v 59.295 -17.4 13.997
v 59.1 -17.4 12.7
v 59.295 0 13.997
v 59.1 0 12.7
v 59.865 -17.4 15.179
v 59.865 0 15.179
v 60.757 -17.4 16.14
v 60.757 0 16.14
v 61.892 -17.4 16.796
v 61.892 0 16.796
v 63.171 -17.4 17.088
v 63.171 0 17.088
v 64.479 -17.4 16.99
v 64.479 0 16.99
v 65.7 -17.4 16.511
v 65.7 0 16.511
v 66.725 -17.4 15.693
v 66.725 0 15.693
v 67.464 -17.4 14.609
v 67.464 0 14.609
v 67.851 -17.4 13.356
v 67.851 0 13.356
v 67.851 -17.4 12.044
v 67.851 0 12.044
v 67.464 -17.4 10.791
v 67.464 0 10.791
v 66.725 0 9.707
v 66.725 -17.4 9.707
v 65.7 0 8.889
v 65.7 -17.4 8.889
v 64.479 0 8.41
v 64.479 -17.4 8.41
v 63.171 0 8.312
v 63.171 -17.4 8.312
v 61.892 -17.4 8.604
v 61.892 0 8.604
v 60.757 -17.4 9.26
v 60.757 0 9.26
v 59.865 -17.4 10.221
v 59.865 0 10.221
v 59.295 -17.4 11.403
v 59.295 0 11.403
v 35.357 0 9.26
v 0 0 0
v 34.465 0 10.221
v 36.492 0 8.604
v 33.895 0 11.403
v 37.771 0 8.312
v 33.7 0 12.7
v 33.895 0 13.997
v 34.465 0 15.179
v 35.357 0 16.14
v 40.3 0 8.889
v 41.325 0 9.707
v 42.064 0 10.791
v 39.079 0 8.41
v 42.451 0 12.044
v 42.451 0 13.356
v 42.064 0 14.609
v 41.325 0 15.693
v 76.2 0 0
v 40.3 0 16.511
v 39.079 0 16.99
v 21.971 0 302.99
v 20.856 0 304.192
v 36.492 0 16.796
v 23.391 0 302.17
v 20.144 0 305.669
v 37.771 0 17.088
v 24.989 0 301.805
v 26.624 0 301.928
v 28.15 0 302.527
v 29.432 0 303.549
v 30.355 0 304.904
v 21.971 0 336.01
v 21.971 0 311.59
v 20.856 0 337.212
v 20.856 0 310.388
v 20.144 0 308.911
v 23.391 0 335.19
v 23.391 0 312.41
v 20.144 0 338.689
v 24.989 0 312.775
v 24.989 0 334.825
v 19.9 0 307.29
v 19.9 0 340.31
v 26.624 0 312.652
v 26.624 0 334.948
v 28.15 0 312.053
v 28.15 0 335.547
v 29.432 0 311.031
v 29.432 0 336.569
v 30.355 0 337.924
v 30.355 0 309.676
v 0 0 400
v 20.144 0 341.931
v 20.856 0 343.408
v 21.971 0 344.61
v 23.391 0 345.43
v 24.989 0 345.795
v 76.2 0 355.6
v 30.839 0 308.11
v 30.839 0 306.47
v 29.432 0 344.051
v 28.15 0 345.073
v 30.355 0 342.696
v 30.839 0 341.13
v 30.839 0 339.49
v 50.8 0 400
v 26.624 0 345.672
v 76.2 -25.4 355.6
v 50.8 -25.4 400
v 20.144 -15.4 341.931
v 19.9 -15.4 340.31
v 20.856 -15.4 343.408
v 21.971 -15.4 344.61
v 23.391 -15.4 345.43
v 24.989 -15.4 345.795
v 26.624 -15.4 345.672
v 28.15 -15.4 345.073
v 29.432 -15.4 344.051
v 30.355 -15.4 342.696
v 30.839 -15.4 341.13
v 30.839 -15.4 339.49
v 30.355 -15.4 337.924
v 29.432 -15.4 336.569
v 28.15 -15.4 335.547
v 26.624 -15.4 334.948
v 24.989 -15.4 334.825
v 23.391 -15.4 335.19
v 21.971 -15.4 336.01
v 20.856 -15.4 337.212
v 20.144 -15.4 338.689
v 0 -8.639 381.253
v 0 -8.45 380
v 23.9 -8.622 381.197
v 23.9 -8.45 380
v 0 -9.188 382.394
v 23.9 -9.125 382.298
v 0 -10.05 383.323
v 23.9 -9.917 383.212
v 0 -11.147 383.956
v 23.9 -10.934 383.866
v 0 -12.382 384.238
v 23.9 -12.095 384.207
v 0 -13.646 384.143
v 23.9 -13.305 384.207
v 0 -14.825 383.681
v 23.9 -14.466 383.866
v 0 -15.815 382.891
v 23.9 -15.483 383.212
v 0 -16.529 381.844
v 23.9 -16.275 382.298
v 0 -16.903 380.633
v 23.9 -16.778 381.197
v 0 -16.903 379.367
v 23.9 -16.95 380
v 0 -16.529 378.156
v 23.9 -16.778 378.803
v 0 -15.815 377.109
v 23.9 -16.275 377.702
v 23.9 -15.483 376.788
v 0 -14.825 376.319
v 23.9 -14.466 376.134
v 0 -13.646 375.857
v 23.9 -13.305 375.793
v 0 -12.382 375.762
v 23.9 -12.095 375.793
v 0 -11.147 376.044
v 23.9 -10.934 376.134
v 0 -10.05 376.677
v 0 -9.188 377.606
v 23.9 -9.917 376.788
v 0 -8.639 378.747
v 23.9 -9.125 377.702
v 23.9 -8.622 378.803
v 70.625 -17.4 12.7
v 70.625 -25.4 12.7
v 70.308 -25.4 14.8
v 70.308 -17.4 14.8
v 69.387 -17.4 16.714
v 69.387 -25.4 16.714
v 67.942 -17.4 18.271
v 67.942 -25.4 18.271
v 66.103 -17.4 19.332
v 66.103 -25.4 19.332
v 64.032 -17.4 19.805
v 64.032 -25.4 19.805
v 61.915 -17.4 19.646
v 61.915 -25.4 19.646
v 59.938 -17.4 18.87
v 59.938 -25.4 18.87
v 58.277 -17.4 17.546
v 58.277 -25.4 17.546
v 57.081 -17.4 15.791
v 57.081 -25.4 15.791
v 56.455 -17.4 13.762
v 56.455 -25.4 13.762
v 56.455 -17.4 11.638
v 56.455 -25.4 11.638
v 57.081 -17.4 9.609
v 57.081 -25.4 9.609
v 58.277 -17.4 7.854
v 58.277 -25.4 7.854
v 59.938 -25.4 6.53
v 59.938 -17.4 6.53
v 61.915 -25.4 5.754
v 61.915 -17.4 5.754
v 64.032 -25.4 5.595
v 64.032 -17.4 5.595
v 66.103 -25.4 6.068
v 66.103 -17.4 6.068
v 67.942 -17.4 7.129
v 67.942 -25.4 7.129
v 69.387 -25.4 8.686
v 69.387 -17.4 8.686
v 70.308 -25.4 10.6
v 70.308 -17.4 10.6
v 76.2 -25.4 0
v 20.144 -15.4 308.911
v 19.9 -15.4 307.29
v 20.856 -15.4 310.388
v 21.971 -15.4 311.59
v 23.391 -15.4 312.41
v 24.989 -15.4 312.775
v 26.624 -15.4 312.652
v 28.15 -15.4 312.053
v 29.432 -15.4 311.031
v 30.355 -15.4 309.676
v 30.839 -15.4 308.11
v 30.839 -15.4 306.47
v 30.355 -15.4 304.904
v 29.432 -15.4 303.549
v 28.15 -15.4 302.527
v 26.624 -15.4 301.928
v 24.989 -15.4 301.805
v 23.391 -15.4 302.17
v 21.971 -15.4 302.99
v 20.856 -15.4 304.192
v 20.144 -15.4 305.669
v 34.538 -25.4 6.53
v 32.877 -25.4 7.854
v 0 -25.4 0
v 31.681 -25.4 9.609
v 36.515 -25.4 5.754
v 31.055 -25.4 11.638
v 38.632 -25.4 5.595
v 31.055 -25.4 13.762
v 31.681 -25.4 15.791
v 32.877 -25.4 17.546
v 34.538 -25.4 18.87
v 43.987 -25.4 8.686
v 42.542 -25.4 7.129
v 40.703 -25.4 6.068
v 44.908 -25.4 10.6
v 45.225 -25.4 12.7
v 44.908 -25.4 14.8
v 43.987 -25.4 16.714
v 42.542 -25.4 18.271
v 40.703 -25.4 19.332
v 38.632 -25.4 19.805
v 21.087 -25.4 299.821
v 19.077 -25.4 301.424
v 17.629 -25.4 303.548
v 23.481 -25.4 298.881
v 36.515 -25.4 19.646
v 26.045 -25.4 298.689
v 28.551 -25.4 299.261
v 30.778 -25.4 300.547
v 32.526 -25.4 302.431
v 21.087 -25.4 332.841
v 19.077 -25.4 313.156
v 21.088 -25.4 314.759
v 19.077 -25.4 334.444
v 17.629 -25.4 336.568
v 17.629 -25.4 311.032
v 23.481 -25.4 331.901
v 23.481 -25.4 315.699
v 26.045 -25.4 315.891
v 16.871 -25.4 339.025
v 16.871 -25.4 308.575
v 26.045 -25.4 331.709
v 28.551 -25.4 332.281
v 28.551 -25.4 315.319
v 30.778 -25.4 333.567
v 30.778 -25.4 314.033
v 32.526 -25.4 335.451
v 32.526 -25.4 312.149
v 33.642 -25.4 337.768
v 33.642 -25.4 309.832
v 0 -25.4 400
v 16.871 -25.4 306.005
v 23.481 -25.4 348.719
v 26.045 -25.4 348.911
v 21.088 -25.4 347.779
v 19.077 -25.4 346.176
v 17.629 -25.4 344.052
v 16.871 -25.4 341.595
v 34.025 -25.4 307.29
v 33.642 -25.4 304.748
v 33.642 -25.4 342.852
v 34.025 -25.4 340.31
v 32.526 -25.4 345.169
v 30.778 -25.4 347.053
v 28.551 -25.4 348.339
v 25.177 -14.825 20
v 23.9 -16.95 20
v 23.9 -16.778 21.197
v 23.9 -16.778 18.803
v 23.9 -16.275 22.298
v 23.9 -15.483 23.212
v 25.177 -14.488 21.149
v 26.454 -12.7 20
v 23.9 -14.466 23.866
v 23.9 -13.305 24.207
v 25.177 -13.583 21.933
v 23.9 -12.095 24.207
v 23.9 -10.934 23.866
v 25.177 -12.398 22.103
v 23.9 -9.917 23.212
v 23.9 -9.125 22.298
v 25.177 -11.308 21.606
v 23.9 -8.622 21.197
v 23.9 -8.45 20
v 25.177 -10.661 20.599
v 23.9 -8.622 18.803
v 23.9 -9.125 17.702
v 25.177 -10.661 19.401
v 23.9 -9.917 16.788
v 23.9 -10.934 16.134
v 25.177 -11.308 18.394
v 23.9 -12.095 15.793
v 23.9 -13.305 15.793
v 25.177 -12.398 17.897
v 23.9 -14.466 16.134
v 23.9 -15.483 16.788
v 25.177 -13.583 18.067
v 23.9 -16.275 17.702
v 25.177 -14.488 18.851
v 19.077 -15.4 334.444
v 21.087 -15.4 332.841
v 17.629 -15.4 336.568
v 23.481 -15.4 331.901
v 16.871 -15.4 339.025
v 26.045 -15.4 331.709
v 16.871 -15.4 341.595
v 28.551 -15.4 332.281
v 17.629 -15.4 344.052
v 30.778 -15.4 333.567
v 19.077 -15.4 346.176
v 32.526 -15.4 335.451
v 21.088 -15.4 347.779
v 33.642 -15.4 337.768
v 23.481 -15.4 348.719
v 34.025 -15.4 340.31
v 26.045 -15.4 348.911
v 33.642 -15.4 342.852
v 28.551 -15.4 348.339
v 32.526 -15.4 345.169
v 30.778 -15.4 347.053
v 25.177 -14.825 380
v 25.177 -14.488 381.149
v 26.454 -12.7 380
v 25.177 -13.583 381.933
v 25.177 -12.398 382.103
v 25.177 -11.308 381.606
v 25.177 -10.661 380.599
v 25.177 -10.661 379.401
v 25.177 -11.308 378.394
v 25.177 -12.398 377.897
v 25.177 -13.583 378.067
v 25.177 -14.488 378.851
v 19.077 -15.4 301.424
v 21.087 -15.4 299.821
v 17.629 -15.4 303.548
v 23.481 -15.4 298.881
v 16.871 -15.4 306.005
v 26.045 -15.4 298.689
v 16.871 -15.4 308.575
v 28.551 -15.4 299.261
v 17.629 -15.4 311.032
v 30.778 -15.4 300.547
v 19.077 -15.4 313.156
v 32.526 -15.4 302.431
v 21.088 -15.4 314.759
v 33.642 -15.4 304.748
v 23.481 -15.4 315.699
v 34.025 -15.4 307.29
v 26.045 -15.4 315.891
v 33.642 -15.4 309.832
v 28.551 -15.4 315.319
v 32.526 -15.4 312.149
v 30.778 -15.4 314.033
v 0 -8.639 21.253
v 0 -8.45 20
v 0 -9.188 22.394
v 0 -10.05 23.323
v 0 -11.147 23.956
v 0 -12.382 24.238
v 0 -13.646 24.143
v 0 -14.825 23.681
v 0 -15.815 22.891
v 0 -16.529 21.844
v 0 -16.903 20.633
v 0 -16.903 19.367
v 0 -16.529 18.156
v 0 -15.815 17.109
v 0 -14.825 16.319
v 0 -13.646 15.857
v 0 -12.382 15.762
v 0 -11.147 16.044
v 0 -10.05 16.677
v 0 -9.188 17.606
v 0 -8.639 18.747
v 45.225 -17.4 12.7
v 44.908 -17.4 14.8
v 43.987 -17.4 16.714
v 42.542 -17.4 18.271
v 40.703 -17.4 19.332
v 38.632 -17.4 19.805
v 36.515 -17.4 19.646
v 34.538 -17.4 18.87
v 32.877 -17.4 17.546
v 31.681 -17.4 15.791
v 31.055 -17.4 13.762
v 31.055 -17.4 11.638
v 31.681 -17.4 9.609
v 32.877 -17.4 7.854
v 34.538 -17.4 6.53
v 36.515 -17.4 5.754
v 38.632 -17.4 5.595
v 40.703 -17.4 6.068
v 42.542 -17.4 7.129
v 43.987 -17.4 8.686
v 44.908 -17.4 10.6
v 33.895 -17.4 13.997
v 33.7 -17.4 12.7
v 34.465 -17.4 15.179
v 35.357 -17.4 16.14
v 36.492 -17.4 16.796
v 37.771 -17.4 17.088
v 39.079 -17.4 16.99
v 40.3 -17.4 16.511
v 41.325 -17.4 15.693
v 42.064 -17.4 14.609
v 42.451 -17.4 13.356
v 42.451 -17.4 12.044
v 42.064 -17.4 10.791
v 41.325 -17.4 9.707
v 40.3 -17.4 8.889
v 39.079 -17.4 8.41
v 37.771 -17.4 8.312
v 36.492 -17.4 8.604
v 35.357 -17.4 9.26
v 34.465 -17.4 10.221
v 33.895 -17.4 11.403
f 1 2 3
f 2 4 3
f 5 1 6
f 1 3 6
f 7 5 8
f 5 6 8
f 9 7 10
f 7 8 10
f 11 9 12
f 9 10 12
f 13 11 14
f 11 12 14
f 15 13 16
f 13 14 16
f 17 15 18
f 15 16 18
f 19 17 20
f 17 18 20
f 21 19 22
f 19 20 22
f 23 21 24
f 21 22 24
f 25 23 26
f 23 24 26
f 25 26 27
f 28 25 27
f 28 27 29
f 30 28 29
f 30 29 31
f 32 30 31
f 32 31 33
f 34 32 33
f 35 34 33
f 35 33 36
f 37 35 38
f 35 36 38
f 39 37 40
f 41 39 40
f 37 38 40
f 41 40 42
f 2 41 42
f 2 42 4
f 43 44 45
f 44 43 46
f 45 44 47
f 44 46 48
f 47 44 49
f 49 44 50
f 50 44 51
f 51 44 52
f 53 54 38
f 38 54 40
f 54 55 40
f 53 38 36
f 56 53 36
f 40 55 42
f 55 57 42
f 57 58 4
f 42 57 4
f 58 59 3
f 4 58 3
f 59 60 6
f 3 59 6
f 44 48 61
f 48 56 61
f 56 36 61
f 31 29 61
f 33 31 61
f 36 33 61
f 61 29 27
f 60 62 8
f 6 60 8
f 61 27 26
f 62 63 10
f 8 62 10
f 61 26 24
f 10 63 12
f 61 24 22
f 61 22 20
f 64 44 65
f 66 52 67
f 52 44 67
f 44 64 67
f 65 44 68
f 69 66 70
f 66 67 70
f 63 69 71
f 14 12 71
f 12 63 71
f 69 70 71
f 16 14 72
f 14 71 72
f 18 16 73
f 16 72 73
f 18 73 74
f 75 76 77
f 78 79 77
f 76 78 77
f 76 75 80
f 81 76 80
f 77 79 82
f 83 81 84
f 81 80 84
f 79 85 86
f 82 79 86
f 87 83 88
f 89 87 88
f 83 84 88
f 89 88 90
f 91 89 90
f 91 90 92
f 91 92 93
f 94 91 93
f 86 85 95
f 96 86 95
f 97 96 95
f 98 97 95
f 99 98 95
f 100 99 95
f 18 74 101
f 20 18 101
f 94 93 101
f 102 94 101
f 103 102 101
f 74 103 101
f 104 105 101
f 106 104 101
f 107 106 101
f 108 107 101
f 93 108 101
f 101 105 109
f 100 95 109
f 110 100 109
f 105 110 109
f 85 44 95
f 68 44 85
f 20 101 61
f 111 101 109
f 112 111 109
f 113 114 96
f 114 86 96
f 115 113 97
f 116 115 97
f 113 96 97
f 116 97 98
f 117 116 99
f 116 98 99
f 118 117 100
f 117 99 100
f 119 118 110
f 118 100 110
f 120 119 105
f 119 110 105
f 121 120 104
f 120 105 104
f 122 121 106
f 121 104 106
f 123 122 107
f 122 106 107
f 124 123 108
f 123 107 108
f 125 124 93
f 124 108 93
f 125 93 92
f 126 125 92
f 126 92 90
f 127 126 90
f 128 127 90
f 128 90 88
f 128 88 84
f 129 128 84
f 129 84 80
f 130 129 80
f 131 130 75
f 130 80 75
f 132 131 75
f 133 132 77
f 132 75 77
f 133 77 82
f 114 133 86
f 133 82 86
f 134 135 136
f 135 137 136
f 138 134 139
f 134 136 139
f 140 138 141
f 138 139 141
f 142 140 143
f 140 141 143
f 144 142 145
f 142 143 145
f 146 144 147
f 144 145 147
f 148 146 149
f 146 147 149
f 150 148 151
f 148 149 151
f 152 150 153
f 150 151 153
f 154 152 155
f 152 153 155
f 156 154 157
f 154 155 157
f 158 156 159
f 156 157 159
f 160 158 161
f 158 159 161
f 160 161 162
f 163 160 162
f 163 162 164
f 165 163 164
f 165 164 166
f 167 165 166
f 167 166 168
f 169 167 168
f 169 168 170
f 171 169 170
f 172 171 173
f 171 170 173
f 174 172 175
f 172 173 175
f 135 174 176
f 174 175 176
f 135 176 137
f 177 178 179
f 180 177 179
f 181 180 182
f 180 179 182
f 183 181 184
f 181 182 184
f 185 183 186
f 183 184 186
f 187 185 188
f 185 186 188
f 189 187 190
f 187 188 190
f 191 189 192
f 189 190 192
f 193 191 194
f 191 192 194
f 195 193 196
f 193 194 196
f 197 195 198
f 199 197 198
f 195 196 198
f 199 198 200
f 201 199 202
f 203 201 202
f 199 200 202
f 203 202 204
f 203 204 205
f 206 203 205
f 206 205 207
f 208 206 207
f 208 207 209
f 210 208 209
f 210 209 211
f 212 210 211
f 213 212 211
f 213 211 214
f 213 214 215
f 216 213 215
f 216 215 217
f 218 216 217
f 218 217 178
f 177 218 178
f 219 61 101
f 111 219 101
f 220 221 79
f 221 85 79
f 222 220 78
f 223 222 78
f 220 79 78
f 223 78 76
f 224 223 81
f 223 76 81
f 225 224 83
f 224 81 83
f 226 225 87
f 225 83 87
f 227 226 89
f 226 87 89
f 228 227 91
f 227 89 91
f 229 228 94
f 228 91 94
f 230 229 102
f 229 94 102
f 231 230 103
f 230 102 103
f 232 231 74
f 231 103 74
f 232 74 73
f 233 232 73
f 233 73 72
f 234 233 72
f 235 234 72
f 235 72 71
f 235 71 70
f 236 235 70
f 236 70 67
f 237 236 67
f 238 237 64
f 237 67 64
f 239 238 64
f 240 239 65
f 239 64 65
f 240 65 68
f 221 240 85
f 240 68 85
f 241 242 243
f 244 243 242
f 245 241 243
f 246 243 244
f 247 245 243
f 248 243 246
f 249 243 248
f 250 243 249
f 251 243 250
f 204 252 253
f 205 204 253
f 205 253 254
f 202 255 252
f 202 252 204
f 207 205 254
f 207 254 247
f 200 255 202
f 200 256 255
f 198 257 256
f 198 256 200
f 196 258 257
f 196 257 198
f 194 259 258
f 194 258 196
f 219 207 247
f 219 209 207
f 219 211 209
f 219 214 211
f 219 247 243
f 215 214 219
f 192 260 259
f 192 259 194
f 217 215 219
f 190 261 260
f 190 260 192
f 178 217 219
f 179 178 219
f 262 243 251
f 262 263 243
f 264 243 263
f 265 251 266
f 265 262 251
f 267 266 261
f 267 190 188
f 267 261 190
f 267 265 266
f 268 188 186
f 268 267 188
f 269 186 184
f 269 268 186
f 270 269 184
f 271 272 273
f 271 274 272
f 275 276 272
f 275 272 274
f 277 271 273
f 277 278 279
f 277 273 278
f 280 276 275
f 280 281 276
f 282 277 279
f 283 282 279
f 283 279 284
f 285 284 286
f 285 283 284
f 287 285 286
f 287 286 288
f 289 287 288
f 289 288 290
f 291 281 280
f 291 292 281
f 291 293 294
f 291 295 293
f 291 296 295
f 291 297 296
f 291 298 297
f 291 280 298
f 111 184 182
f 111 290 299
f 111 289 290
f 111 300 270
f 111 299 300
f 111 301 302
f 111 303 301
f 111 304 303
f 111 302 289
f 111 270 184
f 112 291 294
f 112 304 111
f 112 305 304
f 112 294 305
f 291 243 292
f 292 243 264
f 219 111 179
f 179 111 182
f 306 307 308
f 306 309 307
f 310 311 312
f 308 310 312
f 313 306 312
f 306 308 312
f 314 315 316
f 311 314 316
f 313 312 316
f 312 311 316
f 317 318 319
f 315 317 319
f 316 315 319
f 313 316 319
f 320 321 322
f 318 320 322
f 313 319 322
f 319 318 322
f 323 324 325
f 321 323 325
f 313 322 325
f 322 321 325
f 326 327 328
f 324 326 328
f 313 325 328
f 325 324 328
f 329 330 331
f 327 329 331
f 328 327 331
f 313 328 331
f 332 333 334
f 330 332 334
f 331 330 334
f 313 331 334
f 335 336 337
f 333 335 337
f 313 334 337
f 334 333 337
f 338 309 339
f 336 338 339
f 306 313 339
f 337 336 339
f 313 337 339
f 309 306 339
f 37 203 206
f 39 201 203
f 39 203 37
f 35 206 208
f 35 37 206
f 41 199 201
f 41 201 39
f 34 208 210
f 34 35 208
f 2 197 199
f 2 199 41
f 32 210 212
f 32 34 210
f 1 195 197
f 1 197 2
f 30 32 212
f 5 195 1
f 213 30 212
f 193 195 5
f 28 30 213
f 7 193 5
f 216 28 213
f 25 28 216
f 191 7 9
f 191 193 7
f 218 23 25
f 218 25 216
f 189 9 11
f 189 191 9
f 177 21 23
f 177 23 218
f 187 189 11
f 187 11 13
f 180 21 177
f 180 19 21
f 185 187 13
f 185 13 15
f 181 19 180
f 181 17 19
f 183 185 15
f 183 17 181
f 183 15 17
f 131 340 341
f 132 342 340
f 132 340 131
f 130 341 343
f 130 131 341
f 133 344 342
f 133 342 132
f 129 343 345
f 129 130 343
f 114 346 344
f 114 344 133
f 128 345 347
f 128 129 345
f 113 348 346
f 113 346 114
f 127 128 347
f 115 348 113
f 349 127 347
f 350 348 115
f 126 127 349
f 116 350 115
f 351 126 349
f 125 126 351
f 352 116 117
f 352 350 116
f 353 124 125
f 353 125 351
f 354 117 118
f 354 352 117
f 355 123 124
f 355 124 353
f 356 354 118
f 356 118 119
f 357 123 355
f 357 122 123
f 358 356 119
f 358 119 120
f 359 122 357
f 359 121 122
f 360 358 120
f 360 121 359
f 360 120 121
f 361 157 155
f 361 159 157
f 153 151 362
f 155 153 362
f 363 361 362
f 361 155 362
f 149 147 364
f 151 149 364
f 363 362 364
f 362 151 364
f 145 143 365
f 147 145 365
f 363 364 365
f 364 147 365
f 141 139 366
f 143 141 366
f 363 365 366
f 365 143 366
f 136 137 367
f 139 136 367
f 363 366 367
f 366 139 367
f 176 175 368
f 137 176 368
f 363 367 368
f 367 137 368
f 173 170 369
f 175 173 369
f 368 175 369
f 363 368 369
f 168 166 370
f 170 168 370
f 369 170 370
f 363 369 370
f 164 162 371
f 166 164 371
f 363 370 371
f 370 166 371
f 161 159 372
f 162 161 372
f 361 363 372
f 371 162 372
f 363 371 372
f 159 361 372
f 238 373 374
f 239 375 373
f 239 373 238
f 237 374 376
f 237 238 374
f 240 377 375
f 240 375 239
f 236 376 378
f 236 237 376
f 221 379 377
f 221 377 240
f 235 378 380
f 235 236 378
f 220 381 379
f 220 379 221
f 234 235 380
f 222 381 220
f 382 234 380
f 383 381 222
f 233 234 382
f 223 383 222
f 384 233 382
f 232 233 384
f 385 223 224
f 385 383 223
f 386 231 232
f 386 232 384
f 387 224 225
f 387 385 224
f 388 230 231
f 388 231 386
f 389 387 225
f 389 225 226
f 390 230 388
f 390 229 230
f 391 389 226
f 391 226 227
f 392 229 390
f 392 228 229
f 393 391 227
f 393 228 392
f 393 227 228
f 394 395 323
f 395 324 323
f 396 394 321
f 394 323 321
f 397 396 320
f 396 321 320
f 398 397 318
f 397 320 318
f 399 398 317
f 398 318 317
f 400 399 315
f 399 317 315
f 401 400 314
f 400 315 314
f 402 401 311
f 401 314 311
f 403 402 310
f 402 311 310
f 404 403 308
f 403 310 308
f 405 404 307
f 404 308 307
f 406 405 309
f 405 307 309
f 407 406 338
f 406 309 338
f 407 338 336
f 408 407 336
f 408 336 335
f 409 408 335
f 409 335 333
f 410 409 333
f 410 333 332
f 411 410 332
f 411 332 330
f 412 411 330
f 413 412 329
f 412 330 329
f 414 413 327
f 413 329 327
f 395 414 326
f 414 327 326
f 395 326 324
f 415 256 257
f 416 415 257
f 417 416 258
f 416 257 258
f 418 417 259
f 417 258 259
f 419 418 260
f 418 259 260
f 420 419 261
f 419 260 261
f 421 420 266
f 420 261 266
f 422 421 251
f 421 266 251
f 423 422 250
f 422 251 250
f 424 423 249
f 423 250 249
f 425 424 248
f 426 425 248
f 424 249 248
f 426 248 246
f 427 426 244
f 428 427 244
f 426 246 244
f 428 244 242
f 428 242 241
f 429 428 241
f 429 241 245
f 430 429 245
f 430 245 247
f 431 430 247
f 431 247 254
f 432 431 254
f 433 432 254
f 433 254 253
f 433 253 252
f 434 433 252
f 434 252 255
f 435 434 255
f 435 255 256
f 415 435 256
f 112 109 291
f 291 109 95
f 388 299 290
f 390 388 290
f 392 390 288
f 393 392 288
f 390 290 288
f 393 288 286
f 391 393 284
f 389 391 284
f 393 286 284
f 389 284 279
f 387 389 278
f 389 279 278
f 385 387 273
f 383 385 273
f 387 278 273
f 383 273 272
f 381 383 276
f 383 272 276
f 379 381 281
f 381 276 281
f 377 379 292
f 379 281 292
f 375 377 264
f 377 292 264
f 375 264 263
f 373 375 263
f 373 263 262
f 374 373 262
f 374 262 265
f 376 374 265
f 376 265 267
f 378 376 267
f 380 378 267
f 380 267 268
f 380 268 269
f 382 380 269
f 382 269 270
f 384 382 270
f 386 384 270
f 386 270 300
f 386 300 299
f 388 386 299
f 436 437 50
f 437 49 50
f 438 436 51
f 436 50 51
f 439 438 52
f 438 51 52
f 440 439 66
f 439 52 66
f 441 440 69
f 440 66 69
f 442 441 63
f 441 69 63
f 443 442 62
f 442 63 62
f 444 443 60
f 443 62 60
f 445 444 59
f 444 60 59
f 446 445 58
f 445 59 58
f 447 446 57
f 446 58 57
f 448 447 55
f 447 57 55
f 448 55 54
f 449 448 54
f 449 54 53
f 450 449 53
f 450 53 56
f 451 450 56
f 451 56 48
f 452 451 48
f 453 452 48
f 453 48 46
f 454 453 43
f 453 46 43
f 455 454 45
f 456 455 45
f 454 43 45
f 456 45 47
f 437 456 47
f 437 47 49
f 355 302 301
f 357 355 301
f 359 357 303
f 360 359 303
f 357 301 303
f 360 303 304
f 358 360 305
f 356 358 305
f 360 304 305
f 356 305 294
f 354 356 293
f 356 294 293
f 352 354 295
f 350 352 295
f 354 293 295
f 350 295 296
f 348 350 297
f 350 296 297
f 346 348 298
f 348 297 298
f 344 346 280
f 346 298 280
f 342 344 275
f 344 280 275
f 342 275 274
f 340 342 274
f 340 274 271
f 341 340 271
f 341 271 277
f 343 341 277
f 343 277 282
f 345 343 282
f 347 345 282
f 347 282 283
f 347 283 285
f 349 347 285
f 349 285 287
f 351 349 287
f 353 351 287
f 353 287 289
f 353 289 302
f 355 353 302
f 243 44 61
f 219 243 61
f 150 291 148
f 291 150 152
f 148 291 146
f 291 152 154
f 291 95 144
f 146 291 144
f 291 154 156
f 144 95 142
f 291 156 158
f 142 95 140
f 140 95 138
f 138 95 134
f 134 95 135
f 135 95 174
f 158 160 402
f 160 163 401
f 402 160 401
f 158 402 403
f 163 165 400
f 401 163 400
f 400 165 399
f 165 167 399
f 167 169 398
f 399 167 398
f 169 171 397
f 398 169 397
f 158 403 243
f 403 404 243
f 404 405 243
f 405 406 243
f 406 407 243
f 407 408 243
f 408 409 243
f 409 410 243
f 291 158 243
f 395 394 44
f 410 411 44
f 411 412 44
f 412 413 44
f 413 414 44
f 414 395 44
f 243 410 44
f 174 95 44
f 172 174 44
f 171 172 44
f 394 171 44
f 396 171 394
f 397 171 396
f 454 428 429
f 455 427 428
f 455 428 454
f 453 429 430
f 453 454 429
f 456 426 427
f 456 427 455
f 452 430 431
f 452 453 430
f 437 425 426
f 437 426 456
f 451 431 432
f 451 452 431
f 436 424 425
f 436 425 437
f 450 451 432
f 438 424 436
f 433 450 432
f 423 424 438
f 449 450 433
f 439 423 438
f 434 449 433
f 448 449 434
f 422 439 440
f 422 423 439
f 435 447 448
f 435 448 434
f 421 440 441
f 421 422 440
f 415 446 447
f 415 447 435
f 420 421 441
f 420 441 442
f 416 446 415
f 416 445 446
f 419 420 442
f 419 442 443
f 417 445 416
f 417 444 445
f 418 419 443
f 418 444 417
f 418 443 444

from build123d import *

# Parameters (mm, degrees)
F1_DEPTH       = 25.4
F3_D           = 8.5
F3_DEPTH       = 23.9
F3_TIP         = 2.5536576309
F5_D           = 8.8
F5_CBORE_D     = 14.25
F5_CBORE_DEPTH = 8
F7_D           = 11
F7_CBORE_D     = 17.25
F7_CBORE_DEPTH = 10


with BuildPart() as f1:
    # F0 (on Front) → F1 (new body)
    with BuildSketch(Plane.XZ):
        Polygon((0, 400), (0, 0), (76.2, 0), (76.2, 355.6), (50.8, 400), align=None)
    extrude(amount=F1_DEPTH)

    # F3
    with Locations(Plane(origin=(0, 0, 0), x_dir=(0, -1, 0), z_dir=(-1, 0, 0))):
        with Locations((12.7, 20), (12.7, 380)):
            Hole(F3_D / 2, depth=F3_DEPTH)
            with Locations((0, 0, -(F3_DEPTH + F3_TIP / 2))):  # 118° drill point
                Cone(0, F3_D / 2, F3_TIP, mode=Mode.SUBTRACT)

    # F5 (through all)
    with Locations(Plane.XZ.offset(25.4)):
        with Locations((38.1, 12.7), (63.5, 12.7)):
            CounterBoreHole(F5_D / 2, F5_CBORE_D / 2, F5_CBORE_DEPTH)

    # F7 (through all)
    with Locations(Plane.XZ.offset(25.4)):
        with Locations((25.4, 340.31), (25.4, 307.29)):
            CounterBoreHole(F7_D / 2, F7_CBORE_D / 2, F7_CBORE_DEPTH)


solid = f1.part
